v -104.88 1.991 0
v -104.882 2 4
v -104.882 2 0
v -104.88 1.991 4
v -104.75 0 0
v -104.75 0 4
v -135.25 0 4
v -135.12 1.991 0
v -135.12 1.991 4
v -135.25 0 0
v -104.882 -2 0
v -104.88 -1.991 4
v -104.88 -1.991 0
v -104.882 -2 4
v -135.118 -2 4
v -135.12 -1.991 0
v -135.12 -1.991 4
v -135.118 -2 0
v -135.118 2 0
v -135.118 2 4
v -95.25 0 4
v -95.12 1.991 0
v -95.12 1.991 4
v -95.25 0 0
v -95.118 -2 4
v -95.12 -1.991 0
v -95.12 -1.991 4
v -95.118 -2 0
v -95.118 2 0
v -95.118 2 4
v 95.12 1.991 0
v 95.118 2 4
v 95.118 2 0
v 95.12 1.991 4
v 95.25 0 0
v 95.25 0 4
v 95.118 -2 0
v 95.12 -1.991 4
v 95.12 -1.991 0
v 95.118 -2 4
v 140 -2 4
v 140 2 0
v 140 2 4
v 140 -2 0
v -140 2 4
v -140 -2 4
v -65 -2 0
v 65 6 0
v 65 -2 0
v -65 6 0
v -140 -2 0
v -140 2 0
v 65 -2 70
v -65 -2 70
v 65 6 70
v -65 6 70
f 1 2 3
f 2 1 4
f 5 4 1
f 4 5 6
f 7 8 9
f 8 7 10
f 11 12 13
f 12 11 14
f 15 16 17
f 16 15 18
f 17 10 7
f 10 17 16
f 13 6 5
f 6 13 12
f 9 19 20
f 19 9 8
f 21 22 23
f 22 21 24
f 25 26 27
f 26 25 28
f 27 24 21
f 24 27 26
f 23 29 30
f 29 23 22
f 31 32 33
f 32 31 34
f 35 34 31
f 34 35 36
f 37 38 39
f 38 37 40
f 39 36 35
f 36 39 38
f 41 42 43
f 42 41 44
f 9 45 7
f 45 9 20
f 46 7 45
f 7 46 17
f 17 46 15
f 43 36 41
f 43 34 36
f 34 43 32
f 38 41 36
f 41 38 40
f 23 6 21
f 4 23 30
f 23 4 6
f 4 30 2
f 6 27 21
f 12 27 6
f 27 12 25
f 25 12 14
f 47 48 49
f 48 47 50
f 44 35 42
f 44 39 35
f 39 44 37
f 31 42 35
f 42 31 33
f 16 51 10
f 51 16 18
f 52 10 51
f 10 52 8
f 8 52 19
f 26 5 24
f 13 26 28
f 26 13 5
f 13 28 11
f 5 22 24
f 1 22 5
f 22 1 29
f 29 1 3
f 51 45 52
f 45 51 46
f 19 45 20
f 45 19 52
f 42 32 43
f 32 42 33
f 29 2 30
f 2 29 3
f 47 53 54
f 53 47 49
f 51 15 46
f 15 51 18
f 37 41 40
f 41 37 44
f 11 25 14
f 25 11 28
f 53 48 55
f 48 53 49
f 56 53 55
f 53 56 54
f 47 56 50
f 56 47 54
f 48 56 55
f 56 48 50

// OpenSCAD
// Tube rack - a flat plate with a regular grid of through-holes for conical (Falcon-type) tubes,
// with two solid walls along the long edges. Printed upside down and flipped over, it stands on the
// two walls with the tubes passing through the holes. NOVEL general part.
//

cols   = 6;
pitch_x = 40;
pitch_y = 40;
layer_h = 4;
wall_h  = 70;
tube_d  = 30.5;

$fn = 48;

plate_w = cols * pitch_x + 2 * (pitch_x / 2);   // centre-to-centre span + one radius each side
plate_t = layer_h;

difference() {
    translate([-plate_w / 2, -plate_t / 2, 0]) cube([plate_w, plate_t, layer_h]);
    for (i = [-cols / 2 : 1 : cols / 2 - 1])
        for (j = [-1 : 1])
            translate([i * pitch_x, j * pitch_y, -1]) cylinder(h = layer_h + 2, d = tube_d);
}

for (i = [-1 : 1])
    translate([-130 / 2, i * plate_t / 2, 0]) cube([130, 4, wall_h]);
